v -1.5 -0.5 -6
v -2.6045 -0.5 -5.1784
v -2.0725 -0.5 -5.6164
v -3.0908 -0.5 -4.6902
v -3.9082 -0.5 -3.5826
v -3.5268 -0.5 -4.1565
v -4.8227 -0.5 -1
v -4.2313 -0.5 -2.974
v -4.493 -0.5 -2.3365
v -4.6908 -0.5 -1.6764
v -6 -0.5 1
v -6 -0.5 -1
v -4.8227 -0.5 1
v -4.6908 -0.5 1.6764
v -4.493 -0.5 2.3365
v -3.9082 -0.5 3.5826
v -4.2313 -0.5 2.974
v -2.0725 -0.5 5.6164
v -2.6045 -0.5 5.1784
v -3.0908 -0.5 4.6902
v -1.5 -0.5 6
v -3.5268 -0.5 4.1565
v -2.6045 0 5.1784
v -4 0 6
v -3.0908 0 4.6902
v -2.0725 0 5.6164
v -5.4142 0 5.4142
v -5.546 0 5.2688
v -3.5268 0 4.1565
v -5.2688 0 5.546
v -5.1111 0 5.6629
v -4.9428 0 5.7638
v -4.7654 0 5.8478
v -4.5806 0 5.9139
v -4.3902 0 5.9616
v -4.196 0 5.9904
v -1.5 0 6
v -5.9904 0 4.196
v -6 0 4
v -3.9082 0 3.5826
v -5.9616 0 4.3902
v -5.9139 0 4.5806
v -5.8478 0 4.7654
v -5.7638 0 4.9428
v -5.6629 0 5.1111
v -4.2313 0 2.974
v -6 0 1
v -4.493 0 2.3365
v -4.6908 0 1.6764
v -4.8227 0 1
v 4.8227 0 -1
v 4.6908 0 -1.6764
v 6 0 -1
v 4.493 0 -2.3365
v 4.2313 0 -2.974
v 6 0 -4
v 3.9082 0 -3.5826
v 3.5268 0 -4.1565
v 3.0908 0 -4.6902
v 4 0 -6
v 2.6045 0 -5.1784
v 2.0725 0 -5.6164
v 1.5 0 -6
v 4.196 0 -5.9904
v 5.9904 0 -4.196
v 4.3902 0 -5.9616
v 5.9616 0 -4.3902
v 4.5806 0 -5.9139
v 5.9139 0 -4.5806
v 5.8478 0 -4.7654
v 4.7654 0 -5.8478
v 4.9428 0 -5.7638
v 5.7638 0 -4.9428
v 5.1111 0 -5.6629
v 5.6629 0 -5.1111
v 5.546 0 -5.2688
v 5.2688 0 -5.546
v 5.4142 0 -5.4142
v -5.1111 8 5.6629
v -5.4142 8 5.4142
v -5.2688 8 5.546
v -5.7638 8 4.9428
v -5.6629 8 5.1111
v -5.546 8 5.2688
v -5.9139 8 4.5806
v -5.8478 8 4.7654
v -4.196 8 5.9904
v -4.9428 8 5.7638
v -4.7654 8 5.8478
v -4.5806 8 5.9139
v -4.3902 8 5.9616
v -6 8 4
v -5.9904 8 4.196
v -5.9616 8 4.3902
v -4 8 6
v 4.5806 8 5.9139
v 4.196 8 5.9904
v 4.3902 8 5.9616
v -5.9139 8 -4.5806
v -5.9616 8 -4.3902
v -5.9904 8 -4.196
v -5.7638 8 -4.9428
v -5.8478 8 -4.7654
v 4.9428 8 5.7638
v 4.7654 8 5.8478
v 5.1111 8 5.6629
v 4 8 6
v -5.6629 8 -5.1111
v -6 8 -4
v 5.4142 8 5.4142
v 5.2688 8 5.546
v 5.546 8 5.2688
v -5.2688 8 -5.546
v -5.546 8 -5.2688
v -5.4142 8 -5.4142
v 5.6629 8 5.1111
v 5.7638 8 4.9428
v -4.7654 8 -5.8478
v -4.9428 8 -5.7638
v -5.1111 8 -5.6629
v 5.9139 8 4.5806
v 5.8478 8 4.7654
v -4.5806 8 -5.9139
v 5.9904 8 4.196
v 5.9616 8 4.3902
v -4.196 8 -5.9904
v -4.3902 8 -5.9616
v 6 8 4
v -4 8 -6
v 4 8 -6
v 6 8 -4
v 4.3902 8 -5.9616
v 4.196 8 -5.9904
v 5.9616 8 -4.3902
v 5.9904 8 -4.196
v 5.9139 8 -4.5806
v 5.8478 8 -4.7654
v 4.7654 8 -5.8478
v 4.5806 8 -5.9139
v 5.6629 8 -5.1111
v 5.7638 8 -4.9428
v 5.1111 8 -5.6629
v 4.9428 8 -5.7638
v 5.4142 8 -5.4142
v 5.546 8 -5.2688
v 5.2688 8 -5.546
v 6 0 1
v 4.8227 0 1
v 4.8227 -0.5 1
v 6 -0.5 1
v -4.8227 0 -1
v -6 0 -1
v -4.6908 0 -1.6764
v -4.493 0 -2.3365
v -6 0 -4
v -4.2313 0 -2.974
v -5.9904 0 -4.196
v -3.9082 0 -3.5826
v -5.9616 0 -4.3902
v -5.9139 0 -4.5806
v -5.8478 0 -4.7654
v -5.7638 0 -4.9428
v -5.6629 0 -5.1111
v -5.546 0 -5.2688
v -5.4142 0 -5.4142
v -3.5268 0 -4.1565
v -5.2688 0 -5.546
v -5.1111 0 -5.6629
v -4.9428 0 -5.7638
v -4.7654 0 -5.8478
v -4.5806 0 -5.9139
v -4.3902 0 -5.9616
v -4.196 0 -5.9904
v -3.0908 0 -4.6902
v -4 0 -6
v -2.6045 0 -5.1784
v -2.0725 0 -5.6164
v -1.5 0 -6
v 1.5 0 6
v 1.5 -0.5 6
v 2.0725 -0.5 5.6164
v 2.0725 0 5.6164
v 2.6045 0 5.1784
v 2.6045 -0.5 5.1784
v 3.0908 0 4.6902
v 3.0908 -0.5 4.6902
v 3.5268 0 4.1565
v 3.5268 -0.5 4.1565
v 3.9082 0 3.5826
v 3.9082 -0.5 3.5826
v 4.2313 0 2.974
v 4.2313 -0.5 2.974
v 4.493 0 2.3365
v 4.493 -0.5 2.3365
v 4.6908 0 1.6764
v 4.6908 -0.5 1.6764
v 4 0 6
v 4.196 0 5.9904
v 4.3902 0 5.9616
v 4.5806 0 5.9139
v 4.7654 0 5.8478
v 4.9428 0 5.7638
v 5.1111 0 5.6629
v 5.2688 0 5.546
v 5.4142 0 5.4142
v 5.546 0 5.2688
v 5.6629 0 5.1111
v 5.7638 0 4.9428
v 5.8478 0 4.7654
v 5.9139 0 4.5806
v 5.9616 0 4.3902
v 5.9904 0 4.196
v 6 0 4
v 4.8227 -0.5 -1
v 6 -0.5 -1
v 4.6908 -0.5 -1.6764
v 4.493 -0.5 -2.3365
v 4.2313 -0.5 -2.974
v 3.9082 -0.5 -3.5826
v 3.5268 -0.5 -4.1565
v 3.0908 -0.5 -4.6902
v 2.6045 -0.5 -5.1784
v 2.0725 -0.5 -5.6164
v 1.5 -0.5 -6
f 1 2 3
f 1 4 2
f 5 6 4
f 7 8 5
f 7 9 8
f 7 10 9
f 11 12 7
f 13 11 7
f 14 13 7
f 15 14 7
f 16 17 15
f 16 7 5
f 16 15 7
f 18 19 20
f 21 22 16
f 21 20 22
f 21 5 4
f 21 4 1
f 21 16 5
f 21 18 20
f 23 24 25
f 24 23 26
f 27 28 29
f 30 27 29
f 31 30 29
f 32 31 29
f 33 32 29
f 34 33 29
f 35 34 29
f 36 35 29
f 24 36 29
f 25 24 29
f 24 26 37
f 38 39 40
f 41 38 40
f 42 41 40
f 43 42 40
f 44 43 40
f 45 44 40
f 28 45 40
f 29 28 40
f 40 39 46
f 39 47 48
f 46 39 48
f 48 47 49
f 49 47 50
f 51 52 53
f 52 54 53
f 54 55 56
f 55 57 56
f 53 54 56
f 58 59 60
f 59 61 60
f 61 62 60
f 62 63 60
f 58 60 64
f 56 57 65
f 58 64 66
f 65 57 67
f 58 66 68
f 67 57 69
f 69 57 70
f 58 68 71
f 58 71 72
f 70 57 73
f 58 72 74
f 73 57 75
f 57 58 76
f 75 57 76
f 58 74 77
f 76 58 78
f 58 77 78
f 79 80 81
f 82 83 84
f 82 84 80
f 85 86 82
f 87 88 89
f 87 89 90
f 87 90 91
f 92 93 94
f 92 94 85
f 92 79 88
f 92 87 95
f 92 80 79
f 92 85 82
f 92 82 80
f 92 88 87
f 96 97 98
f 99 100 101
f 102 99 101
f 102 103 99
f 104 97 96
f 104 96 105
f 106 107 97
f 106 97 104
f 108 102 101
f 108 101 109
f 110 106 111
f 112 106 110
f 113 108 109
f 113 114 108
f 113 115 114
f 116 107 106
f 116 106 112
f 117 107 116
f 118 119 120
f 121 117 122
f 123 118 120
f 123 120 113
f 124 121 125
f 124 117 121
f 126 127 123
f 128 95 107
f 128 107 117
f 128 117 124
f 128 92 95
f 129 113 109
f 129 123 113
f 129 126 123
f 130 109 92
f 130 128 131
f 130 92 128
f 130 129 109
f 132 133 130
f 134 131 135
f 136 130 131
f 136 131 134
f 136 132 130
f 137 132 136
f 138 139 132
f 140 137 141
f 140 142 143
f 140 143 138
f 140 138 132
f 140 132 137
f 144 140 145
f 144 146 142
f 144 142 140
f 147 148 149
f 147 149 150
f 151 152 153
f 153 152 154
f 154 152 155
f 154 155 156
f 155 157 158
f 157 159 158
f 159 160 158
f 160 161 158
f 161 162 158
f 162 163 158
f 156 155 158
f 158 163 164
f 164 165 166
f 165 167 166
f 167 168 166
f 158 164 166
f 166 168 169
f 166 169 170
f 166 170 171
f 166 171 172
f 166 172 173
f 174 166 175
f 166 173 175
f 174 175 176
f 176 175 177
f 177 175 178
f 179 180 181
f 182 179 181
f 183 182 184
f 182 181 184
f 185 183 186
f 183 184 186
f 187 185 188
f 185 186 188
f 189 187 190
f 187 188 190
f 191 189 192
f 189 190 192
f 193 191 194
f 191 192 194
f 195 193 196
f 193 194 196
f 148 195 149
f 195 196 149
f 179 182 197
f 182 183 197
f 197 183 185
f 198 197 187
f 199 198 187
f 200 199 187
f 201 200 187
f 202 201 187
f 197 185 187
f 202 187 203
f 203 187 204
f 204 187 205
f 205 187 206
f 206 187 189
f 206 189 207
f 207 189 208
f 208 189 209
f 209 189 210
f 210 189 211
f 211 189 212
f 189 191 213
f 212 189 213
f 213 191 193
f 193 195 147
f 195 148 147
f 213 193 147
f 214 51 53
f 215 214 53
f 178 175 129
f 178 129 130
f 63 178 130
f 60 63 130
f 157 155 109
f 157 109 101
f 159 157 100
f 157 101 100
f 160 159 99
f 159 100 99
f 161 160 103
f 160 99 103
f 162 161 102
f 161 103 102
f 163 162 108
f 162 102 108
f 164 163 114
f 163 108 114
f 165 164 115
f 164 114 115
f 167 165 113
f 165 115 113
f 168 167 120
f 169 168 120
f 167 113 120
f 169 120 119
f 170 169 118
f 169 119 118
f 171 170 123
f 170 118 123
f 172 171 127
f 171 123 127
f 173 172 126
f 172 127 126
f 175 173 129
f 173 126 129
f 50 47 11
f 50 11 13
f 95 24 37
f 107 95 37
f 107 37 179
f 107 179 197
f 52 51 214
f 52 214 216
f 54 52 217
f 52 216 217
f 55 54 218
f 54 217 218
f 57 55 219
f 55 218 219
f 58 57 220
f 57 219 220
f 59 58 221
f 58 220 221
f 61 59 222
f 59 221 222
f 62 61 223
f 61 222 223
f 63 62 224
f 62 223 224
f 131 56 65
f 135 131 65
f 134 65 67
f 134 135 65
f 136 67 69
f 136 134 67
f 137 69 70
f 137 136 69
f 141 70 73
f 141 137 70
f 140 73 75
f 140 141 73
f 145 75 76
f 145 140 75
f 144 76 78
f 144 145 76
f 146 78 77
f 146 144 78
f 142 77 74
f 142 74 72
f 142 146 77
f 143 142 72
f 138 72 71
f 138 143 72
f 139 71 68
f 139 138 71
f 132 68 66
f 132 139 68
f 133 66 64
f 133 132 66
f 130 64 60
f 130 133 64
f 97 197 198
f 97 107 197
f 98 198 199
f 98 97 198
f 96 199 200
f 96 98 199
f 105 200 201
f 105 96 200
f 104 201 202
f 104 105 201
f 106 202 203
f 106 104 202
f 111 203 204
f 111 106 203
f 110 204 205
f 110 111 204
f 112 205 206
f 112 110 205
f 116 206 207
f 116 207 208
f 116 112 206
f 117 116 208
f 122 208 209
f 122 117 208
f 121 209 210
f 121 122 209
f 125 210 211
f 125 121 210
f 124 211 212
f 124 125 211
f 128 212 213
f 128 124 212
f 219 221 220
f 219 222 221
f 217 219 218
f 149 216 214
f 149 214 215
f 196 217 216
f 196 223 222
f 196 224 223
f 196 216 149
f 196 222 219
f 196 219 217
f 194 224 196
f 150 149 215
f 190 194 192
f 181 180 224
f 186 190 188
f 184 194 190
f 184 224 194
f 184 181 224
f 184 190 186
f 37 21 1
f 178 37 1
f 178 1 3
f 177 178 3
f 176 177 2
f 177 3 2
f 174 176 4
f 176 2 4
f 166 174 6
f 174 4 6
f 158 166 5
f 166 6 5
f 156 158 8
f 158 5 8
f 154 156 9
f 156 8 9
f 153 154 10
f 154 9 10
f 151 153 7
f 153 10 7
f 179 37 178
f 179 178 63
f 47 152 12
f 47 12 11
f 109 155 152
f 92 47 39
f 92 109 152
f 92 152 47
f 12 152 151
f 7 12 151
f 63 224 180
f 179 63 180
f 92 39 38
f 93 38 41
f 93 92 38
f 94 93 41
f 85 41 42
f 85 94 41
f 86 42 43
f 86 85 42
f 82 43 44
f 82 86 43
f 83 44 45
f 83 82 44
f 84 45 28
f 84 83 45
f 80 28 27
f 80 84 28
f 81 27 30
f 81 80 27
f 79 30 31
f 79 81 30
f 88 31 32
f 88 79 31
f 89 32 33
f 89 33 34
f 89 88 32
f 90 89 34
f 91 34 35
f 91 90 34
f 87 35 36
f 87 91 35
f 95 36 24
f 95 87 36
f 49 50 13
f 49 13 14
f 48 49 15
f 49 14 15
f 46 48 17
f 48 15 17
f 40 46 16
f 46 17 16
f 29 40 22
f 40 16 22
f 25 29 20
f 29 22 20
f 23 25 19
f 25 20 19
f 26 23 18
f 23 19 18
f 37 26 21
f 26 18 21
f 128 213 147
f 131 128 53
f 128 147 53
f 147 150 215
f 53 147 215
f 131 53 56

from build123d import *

# Parameters (mm, degrees)
SKETCH_2_W      = 12
SKETCH_2_H      = 12
EXTRUDE_1_DEPTH = 8
FILLET_1_R      = 2
EXTRUDE_START   = -0.5
EXTRUDE_2_DEPTH = 0.5
SKETCH_4_W      = 2
SKETCH_4_H      = 2
EXTRUDE_3_DEPTH = 0.5


# Read off the part's stored shape, not the designer's step: Бобышка-Вытянуть2
with BuildPart() as part:
    # Эскиз2 → Бобышка-Вытянуть1 (new body)
    with BuildSketch(Plane(origin=(0, 0, 0), x_dir=(1, 0, 0), z_dir=(0, 1, 0))):
        Rectangle(SKETCH_2_W, SKETCH_2_H)
    extrude(amount=EXTRUDE_1_DEPTH)

    # Скругление1
    fillet_1_edges = [part.edges().sort_by_distance(p)[0] for p in [
        (-6, 4, -6),
        (6, 4, -6),
        (6, 4, 6),
        (-6, 4, 6),
    ]]
    fillet(fillet_1_edges, radius=FILLET_1_R)

    # Бобышка-Вытянуть2 outline → Бобышка-Вытянуть2 (add)
    with BuildSketch(Plane(origin=(0, 0, 0), x_dir=(1, 0, 0), z_dir=(0, 1, 0)).offset(EXTRUDE_START)):
        with BuildLine():
            Line((-1.5, -6), (-1.5, 6))
            ThreePointArc((-1.5, 6), (-4.894448725, 0), (-1.5, -6))
        make_face()
        with BuildLine():
            Line((1.5, 6), (1.5, -6))
            ThreePointArc((1.5, -6), (4.894448725, 0), (1.5, 6))
        make_face()
    extrude(amount=EXTRUDE_2_DEPTH)

    # Эскиз4 → Бобышка-Вытянуть3 (add)
    with BuildSketch(Plane.XZ):
        with Locations((-5, 0)):
            Rectangle(SKETCH_4_W, SKETCH_4_H)
        with Locations((5, 0)):
            Rectangle(SKETCH_4_W, SKETCH_4_H)
    extrude(amount=EXTRUDE_3_DEPTH)


solid = part.part
